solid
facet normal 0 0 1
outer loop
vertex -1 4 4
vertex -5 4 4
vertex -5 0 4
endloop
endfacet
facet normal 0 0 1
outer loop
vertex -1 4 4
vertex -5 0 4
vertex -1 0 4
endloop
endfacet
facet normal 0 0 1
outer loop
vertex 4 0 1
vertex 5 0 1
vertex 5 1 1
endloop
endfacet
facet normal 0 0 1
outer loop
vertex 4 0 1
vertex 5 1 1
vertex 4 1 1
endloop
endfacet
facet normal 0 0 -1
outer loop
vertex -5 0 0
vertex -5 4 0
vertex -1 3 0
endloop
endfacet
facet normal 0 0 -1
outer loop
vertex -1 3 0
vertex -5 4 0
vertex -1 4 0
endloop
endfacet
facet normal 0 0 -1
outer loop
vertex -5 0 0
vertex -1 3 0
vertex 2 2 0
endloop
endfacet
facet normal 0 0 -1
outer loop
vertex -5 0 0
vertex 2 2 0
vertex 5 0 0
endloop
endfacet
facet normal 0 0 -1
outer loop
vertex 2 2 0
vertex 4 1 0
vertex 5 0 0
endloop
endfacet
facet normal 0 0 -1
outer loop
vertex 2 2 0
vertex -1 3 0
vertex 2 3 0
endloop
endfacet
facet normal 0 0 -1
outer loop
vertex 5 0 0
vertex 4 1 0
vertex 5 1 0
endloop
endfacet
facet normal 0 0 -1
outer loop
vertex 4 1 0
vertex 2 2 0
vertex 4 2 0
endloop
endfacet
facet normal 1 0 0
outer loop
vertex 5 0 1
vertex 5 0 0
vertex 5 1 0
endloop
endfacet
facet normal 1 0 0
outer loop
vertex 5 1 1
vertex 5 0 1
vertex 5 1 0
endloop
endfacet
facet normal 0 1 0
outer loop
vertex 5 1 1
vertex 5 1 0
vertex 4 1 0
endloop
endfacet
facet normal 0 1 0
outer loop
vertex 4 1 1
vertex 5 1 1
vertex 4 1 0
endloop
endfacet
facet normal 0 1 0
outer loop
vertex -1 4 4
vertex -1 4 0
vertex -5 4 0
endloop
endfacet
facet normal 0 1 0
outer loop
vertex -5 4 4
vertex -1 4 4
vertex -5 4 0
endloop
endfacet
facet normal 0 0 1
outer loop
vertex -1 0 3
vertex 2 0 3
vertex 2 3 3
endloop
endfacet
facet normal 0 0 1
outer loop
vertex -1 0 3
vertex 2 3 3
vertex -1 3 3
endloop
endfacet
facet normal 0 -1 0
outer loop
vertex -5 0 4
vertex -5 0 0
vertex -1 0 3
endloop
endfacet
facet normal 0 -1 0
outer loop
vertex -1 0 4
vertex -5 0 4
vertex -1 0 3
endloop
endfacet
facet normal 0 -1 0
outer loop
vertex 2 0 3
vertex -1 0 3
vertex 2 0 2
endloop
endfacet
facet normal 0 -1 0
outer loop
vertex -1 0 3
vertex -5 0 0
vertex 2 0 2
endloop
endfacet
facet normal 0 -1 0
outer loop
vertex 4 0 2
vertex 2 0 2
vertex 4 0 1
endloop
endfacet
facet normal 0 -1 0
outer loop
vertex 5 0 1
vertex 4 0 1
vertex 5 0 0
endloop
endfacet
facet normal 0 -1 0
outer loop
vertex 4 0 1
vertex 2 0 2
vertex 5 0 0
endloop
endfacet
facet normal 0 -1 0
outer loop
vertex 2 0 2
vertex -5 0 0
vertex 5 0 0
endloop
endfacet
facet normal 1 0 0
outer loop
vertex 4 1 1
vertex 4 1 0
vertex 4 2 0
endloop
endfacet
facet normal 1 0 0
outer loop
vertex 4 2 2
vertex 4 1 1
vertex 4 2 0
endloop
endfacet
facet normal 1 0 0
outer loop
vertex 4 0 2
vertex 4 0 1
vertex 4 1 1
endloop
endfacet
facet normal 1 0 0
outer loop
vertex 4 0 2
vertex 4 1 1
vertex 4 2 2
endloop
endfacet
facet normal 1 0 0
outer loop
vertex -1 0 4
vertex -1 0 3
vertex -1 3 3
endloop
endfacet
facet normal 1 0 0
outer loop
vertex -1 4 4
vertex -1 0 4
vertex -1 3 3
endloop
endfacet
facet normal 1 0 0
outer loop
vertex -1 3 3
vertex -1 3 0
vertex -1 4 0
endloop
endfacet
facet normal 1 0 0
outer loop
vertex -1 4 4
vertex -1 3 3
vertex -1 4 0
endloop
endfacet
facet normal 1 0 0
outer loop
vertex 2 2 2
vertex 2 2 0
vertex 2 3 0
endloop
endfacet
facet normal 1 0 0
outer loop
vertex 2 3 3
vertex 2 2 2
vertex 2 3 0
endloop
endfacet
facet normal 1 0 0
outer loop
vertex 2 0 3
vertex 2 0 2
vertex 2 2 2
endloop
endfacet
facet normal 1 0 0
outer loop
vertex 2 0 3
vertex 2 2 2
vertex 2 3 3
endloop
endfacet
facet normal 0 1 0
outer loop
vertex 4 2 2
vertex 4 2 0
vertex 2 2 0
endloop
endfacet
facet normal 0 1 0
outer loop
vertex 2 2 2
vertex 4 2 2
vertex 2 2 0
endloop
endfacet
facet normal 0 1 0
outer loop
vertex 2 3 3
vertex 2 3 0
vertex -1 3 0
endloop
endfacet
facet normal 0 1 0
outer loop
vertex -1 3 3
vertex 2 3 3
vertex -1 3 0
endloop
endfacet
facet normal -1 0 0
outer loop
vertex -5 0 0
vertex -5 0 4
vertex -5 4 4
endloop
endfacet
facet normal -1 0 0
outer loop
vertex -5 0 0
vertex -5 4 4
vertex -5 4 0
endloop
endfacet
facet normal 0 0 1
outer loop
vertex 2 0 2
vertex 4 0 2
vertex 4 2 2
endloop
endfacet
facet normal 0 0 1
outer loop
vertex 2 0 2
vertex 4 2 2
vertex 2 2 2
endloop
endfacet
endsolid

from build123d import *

# Parameters (mm, degrees)
F1_DEPTH    = 4
F2_T4_DEPTH = 24
F3_T4_DEPTH = 19
F4_T4_DEPTH = 14
F5_R        = 0.99999
F7_DEPTH    = 25


# Not quite as in the source:
# - a fillet or chamfer that OpenCascade refuses, or shapes differently, is made with other operations: its cross-section is extruded or revolved along the edge and cut away or added
# - a fillet or chamfer is up to 0.001 mm smaller than in the source, because OpenCascade refuses the exact size


with BuildPart() as f1:
    # F0 (on Top) → F1 (new body)
    with BuildSketch(Plane.XY):
        Polygon((4, 0), (5, 0), (5, 1), (4, 1), (4, 2), (2, 2), (2, 3), (-1, 3), (-1, 4), (-5, 4), (-5, 0), align=None)
        Polygon((-14, 0), (-5, 0), (-5, 4), (-9, 4), (-9, 3), (-12, 3), (-12, 2), (-14, 2), (-14, 1), (-15, 1), (-15, 0), align=None)
    extrude(amount=F1_DEPTH)

    # F2: fillet of radius 4 on 1 edges, made by hand


with BuildPart() as f2_tool2:
    # F2_s3 → F2_t4 (new body)
    with BuildSketch(Plane.XY.offset(-10)):
        with BuildLine():
            ThreePointArc((-5, 4), (-7.8284271247, 2.8284271247), (-9, 0))
            Line((-9, 0), (-9, 4))
            Line((-9, 4), (-5, 4))
        make_face()
    extrude(amount=F2_T4_DEPTH)

    split(bisect_by=Plane.XZ.offset(-3), keep=Keep.BOTTOM)


with BuildPart() as f1_1:
    add(f1.part)

    # F2_t1: cut F2_tool2
    add(f2_tool2.part, mode=Mode.SUBTRACT)

    # F3: fillet of radius 3 on 1 edges, made by hand


with BuildPart() as f3_tool2:
    # F3_s3 → F3_t4 (new body)
    with BuildSketch(Plane.XY.offset(-7.5)):
        with BuildLine():
            ThreePointArc((-12, 0), (-11.1213203436, 2.1213203436), (-9, 3))
            Line((-9, 3), (-12, 3))
            Line((-12, 3), (-12, 0))
        make_face()
    extrude(amount=F3_T4_DEPTH)

    split(bisect_by=Plane.XZ.offset(-2), keep=Keep.BOTTOM)


with BuildPart() as f1_2:
    add(f1_1.part)

    # F3_t1: cut F3_tool2
    add(f3_tool2.part, mode=Mode.SUBTRACT)

    # F4: fillet of radius 2 on 1 edges, made by hand


with BuildPart() as f4_tool2:
    # F4_s3 → F4_t4 (new body)
    with BuildSketch(Plane.XY.offset(-5)):
        with BuildLine():
            ThreePointArc((-14, 0), (-13.4142135624, 1.4142135624), (-12, 2))
            Line((-12, 2), (-14, 2))
            Line((-14, 2), (-14, 0))
        make_face()
    extrude(amount=F4_T4_DEPTH)

    split(bisect_by=Plane.XZ.offset(-1), keep=Keep.BOTTOM)


with BuildPart() as f1_3:
    add(f1_2.part)

    # F4_t1: cut F4_tool2
    add(f4_tool2.part, mode=Mode.SUBTRACT)

    # F5 (radius 1 in the source; OpenCascade refuses exactly that, so slightly less here)
    f5_edges = [f1_3.edges().sort_by_distance(p)[0] for p in [
        (-15, 1, 2),
    ]]
    fillet(f5_edges, radius=F5_R)

    # F6 (on face) → F7 (intersect)
    with BuildSketch(Plane.XZ):
        Polygon((-5, 0), (5, 0), (5, 1), (4, 1), (4, 2), (2, 2), (2, 3), (-1, 3), (-1, 4), (-5, 4), align=None)
    extrude(amount=-F7_DEPTH, mode=Mode.INTERSECT)


solid = f1_3.part
